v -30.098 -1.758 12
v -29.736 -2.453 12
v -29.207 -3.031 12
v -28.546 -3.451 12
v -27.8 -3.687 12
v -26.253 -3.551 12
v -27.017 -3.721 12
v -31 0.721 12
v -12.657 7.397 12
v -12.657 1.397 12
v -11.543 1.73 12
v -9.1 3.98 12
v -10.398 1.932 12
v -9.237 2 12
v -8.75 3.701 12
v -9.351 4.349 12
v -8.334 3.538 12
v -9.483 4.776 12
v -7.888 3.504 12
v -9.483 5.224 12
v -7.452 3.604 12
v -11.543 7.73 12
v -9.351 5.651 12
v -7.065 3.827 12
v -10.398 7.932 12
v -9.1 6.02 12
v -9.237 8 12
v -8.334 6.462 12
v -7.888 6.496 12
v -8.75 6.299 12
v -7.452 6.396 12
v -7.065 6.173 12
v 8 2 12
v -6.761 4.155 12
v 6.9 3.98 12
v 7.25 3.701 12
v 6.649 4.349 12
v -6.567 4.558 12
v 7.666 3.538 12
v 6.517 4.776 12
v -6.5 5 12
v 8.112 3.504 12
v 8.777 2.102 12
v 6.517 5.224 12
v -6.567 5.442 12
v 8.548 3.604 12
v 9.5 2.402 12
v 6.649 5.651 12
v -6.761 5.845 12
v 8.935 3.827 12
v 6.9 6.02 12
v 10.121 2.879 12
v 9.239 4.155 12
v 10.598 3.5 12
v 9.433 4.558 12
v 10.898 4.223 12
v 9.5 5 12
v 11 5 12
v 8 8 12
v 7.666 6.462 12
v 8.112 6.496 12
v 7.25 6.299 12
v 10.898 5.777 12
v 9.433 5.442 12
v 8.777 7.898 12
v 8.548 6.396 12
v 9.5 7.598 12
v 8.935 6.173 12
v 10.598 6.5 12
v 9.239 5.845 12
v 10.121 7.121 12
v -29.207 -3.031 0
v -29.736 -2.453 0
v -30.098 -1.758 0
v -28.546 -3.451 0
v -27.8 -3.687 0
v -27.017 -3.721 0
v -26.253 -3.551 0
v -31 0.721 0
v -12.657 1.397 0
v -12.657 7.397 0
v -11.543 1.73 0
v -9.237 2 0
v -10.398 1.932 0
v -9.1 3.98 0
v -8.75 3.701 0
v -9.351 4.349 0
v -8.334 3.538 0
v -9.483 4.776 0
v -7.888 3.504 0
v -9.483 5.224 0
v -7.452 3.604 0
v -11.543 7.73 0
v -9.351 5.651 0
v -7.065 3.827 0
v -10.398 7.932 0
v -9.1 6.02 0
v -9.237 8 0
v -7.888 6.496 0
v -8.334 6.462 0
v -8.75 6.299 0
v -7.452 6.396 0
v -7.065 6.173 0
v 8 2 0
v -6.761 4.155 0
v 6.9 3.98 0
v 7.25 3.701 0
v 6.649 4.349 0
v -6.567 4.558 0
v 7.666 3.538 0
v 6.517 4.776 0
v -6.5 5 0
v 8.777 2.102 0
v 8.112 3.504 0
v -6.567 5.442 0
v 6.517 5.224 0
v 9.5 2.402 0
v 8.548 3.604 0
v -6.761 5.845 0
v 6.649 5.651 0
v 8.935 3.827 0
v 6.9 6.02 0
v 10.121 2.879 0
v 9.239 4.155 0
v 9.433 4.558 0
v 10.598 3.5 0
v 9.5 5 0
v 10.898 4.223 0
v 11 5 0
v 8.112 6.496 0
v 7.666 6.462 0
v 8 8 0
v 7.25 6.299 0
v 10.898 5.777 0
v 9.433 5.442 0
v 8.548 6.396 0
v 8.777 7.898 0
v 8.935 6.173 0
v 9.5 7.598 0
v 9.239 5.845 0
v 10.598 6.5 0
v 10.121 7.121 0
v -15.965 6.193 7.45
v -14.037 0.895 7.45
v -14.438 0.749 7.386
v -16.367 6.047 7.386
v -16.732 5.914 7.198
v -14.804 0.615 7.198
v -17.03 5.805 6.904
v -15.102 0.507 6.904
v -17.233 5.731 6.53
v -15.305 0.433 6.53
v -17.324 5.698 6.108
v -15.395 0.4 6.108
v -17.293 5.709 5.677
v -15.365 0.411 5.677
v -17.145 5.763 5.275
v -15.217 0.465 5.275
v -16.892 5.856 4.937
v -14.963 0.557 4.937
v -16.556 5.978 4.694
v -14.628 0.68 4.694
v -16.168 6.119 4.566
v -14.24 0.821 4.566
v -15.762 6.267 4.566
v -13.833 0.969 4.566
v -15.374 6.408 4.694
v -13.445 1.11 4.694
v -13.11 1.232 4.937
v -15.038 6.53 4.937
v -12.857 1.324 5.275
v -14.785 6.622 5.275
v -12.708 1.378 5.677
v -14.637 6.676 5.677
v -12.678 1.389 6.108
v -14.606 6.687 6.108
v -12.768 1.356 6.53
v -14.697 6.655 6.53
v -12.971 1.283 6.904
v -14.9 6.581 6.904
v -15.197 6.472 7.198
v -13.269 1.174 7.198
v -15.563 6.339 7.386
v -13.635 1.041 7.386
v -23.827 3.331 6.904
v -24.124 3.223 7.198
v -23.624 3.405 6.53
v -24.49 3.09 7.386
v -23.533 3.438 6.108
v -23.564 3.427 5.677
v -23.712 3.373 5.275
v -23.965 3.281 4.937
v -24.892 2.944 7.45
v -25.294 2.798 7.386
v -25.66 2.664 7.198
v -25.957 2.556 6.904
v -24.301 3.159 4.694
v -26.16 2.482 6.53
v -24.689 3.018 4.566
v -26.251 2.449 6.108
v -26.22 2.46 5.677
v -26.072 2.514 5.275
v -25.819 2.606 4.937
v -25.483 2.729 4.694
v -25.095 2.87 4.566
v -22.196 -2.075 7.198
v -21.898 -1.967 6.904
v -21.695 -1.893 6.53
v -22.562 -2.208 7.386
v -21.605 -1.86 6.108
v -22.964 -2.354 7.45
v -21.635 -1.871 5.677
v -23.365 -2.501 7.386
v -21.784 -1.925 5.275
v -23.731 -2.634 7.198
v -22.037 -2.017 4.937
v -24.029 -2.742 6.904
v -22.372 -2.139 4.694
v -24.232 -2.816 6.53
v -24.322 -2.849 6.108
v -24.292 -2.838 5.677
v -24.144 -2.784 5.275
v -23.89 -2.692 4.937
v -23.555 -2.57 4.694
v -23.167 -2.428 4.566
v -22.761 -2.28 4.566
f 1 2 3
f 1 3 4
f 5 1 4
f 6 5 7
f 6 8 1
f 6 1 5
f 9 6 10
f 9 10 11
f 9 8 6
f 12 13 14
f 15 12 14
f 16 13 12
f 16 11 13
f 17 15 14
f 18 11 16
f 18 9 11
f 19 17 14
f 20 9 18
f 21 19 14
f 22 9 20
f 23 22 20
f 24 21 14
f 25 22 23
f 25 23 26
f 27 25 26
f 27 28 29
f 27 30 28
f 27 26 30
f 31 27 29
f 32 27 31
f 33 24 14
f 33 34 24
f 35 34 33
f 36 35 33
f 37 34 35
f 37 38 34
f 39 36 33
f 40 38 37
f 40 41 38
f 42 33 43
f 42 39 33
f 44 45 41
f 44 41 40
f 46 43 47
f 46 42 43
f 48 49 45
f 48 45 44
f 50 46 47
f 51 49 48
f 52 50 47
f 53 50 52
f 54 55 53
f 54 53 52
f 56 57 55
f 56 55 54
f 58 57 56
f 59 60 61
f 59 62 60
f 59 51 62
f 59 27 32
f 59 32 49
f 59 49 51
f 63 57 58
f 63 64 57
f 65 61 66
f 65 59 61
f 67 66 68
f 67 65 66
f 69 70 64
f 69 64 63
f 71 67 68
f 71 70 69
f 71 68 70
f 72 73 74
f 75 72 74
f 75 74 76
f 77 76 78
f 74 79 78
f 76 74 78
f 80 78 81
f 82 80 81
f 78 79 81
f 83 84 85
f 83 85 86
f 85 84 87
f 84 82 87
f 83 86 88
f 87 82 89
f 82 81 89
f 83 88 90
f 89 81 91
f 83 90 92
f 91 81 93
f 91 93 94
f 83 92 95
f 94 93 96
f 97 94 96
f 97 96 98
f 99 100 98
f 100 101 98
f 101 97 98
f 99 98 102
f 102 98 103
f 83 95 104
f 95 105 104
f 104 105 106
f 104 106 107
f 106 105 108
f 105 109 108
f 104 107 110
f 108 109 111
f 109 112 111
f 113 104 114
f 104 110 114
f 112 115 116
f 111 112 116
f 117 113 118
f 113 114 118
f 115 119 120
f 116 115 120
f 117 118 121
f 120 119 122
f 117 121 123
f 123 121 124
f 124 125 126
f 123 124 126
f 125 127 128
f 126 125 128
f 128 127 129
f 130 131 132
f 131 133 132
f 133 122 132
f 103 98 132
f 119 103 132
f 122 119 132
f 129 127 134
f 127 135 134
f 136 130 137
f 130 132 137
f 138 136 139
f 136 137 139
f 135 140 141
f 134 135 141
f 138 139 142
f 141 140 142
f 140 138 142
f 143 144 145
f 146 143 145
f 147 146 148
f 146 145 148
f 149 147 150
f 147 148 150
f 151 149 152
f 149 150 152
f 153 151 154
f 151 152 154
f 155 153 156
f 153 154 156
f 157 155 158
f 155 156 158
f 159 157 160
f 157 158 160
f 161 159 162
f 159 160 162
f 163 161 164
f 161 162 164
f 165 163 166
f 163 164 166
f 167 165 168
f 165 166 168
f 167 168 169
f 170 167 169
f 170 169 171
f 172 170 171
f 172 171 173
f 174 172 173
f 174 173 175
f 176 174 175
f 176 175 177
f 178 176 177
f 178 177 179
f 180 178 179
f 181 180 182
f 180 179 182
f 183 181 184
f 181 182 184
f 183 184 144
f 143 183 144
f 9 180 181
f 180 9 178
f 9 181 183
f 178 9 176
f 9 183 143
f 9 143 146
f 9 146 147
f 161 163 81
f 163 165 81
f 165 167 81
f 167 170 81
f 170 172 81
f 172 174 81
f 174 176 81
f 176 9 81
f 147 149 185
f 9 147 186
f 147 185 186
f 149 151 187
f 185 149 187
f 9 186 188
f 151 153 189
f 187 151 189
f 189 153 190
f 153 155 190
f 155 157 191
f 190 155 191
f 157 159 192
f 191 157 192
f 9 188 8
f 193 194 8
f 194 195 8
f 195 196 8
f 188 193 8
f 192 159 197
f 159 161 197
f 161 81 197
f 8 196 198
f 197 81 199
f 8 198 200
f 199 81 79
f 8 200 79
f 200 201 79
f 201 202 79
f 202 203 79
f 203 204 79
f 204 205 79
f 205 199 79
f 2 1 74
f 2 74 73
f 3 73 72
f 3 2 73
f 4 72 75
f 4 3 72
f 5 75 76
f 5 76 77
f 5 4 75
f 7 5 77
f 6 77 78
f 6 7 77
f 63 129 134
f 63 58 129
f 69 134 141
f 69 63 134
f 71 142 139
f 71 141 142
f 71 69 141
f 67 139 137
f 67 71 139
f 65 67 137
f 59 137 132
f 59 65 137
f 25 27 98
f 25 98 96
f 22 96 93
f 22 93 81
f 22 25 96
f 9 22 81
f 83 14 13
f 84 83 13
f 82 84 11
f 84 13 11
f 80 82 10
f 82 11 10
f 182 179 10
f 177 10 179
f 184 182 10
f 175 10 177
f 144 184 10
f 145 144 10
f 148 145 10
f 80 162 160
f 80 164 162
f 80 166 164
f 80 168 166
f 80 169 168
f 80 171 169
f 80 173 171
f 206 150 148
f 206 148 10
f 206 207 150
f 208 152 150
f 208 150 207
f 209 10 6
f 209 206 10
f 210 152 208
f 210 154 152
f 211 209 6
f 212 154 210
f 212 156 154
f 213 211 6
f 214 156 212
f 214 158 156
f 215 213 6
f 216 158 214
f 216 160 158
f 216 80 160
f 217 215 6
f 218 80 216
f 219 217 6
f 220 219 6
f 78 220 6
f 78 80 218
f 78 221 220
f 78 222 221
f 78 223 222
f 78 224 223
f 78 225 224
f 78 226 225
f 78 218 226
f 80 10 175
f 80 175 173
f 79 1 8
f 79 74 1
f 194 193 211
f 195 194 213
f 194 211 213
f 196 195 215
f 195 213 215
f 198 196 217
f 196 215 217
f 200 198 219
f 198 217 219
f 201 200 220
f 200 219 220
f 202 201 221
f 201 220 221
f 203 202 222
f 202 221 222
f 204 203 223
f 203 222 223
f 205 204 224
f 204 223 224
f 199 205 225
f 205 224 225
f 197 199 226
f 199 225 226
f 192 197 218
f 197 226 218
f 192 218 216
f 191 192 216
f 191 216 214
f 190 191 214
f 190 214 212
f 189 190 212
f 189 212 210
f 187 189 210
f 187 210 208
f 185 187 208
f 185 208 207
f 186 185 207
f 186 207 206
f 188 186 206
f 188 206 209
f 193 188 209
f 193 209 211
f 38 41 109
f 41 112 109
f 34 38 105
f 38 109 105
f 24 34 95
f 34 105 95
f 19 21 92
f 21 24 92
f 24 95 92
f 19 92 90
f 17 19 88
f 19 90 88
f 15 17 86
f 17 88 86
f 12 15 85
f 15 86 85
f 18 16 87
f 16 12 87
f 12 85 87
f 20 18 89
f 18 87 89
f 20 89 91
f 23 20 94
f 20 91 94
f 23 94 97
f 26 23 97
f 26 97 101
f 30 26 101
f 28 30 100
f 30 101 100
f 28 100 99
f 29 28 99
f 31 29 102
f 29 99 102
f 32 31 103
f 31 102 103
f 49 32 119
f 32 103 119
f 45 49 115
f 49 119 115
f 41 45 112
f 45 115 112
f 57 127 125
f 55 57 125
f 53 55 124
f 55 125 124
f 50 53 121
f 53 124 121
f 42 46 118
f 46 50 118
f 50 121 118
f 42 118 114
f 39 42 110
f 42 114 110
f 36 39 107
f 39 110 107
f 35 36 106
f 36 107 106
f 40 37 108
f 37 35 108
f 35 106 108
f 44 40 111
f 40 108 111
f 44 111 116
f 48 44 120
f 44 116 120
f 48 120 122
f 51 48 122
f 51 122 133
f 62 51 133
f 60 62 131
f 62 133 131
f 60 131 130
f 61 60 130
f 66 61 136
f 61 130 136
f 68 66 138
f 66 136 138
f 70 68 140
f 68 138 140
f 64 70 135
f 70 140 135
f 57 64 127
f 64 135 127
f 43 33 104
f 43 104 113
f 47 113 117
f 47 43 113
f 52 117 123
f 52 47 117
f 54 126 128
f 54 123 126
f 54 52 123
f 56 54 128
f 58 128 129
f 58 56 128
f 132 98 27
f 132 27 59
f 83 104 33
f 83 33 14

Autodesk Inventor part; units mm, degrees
ref_plane "YZ Plane" through (0, 0, 0) normal (1, 0, 0) x (0, 1, 0)
ref_plane "XZ Plane" through (0, 0, 0) normal (0, 1, 0) x (-1, 0, 0)
ref_plane "XY Plane" through (0, 0, 0) normal (0, 0, 1) x (1, 0, 0)
sketch "Náčrt2" plane through (-5.5, 0.074, 0) normal (0, 0, 1) x (1, 0, 0)
  line L0 (5.5, 7.926) -> (16.5, 7.926)
  circle A0 centre (13.5, 4.926) radius 1.5
  line L1 (16.5, 7.926) -> (16.5, 1.926)
  line L2 (16.5, 1.926) -> (-5.5, 1.926)
  line L3 (5.5, 7.926) -> (-5.5, 7.926)
  circle A1 centre (-2.5, 4.926) radius 1.5
  line L4 (-5.5, 7.926) -> (-5.5, 1.926)
  line L5 (-5.5, 7.926) -> (-25.5, 0.6466)
  line L6 (-5.5, 1.926) -> (-23.5716, -4.6515)
  line L7 (-23.5716, -4.6515) -> (-25.5, 0.6466)
  point P0 (5.5, -0.074)
  point P1 (5.5, -0.074)
  dimension "d2" = 3
  dimension "d5" = 3
  dimension "d4" = 8
  dimension "d3" = 5
  dimension "d1" = 3
  dimension "d0" = 3
  dimension "d11" = 3
  dimension "d22" = 20
  dimension "d23" = 20
  dimension "d39" = 3
  dimension "d40" = 22
  dimension "d41" = 3
extrude "Vysunutí1" add sketch "Náčrt2" along normal blind 12
fillet "Zaoblení2" radius 3 2 edges at (11, 2, 6) (11, 8, 6)
fillet "Zaoblení3" radius 10 2 edges at (-11, 2, 6) (-11, 8, 6)
fillet "Zaoblení4" radius 3 1 edges at (-29.0716, -4.5775, 6)
sketch "Náčrt3" plane through (-31, 0.7206, 12) normal (-0.3420201, 0.9396926, 0) x (0.9396926, 0.3420201, 0)
  line L0 (19.5203, 12) -> (0, 12) projected
  line L1 (0, 12) -> (0, 0) projected
  point P0 (28.884, 12)
  point P1 (16, 6)
  point P2 (6.5, 6)
  dimension "d27" = 6
  dimension "d28" = 6
  dimension "d29" = 9.5
  dimension "d30" = 16
hole "Díra2" at (-15.9649, 6.1929, 6) at (-24.892, 2.9437, 6) direction (0.3420201, -0.9396926, 0) diameter 2.9 end through all clearance for "Šroub se zápustnou hlavou ISO 2009/7046" size "M2.5" standard "ISO"
properties part number "vrch" material "ABS plast"
